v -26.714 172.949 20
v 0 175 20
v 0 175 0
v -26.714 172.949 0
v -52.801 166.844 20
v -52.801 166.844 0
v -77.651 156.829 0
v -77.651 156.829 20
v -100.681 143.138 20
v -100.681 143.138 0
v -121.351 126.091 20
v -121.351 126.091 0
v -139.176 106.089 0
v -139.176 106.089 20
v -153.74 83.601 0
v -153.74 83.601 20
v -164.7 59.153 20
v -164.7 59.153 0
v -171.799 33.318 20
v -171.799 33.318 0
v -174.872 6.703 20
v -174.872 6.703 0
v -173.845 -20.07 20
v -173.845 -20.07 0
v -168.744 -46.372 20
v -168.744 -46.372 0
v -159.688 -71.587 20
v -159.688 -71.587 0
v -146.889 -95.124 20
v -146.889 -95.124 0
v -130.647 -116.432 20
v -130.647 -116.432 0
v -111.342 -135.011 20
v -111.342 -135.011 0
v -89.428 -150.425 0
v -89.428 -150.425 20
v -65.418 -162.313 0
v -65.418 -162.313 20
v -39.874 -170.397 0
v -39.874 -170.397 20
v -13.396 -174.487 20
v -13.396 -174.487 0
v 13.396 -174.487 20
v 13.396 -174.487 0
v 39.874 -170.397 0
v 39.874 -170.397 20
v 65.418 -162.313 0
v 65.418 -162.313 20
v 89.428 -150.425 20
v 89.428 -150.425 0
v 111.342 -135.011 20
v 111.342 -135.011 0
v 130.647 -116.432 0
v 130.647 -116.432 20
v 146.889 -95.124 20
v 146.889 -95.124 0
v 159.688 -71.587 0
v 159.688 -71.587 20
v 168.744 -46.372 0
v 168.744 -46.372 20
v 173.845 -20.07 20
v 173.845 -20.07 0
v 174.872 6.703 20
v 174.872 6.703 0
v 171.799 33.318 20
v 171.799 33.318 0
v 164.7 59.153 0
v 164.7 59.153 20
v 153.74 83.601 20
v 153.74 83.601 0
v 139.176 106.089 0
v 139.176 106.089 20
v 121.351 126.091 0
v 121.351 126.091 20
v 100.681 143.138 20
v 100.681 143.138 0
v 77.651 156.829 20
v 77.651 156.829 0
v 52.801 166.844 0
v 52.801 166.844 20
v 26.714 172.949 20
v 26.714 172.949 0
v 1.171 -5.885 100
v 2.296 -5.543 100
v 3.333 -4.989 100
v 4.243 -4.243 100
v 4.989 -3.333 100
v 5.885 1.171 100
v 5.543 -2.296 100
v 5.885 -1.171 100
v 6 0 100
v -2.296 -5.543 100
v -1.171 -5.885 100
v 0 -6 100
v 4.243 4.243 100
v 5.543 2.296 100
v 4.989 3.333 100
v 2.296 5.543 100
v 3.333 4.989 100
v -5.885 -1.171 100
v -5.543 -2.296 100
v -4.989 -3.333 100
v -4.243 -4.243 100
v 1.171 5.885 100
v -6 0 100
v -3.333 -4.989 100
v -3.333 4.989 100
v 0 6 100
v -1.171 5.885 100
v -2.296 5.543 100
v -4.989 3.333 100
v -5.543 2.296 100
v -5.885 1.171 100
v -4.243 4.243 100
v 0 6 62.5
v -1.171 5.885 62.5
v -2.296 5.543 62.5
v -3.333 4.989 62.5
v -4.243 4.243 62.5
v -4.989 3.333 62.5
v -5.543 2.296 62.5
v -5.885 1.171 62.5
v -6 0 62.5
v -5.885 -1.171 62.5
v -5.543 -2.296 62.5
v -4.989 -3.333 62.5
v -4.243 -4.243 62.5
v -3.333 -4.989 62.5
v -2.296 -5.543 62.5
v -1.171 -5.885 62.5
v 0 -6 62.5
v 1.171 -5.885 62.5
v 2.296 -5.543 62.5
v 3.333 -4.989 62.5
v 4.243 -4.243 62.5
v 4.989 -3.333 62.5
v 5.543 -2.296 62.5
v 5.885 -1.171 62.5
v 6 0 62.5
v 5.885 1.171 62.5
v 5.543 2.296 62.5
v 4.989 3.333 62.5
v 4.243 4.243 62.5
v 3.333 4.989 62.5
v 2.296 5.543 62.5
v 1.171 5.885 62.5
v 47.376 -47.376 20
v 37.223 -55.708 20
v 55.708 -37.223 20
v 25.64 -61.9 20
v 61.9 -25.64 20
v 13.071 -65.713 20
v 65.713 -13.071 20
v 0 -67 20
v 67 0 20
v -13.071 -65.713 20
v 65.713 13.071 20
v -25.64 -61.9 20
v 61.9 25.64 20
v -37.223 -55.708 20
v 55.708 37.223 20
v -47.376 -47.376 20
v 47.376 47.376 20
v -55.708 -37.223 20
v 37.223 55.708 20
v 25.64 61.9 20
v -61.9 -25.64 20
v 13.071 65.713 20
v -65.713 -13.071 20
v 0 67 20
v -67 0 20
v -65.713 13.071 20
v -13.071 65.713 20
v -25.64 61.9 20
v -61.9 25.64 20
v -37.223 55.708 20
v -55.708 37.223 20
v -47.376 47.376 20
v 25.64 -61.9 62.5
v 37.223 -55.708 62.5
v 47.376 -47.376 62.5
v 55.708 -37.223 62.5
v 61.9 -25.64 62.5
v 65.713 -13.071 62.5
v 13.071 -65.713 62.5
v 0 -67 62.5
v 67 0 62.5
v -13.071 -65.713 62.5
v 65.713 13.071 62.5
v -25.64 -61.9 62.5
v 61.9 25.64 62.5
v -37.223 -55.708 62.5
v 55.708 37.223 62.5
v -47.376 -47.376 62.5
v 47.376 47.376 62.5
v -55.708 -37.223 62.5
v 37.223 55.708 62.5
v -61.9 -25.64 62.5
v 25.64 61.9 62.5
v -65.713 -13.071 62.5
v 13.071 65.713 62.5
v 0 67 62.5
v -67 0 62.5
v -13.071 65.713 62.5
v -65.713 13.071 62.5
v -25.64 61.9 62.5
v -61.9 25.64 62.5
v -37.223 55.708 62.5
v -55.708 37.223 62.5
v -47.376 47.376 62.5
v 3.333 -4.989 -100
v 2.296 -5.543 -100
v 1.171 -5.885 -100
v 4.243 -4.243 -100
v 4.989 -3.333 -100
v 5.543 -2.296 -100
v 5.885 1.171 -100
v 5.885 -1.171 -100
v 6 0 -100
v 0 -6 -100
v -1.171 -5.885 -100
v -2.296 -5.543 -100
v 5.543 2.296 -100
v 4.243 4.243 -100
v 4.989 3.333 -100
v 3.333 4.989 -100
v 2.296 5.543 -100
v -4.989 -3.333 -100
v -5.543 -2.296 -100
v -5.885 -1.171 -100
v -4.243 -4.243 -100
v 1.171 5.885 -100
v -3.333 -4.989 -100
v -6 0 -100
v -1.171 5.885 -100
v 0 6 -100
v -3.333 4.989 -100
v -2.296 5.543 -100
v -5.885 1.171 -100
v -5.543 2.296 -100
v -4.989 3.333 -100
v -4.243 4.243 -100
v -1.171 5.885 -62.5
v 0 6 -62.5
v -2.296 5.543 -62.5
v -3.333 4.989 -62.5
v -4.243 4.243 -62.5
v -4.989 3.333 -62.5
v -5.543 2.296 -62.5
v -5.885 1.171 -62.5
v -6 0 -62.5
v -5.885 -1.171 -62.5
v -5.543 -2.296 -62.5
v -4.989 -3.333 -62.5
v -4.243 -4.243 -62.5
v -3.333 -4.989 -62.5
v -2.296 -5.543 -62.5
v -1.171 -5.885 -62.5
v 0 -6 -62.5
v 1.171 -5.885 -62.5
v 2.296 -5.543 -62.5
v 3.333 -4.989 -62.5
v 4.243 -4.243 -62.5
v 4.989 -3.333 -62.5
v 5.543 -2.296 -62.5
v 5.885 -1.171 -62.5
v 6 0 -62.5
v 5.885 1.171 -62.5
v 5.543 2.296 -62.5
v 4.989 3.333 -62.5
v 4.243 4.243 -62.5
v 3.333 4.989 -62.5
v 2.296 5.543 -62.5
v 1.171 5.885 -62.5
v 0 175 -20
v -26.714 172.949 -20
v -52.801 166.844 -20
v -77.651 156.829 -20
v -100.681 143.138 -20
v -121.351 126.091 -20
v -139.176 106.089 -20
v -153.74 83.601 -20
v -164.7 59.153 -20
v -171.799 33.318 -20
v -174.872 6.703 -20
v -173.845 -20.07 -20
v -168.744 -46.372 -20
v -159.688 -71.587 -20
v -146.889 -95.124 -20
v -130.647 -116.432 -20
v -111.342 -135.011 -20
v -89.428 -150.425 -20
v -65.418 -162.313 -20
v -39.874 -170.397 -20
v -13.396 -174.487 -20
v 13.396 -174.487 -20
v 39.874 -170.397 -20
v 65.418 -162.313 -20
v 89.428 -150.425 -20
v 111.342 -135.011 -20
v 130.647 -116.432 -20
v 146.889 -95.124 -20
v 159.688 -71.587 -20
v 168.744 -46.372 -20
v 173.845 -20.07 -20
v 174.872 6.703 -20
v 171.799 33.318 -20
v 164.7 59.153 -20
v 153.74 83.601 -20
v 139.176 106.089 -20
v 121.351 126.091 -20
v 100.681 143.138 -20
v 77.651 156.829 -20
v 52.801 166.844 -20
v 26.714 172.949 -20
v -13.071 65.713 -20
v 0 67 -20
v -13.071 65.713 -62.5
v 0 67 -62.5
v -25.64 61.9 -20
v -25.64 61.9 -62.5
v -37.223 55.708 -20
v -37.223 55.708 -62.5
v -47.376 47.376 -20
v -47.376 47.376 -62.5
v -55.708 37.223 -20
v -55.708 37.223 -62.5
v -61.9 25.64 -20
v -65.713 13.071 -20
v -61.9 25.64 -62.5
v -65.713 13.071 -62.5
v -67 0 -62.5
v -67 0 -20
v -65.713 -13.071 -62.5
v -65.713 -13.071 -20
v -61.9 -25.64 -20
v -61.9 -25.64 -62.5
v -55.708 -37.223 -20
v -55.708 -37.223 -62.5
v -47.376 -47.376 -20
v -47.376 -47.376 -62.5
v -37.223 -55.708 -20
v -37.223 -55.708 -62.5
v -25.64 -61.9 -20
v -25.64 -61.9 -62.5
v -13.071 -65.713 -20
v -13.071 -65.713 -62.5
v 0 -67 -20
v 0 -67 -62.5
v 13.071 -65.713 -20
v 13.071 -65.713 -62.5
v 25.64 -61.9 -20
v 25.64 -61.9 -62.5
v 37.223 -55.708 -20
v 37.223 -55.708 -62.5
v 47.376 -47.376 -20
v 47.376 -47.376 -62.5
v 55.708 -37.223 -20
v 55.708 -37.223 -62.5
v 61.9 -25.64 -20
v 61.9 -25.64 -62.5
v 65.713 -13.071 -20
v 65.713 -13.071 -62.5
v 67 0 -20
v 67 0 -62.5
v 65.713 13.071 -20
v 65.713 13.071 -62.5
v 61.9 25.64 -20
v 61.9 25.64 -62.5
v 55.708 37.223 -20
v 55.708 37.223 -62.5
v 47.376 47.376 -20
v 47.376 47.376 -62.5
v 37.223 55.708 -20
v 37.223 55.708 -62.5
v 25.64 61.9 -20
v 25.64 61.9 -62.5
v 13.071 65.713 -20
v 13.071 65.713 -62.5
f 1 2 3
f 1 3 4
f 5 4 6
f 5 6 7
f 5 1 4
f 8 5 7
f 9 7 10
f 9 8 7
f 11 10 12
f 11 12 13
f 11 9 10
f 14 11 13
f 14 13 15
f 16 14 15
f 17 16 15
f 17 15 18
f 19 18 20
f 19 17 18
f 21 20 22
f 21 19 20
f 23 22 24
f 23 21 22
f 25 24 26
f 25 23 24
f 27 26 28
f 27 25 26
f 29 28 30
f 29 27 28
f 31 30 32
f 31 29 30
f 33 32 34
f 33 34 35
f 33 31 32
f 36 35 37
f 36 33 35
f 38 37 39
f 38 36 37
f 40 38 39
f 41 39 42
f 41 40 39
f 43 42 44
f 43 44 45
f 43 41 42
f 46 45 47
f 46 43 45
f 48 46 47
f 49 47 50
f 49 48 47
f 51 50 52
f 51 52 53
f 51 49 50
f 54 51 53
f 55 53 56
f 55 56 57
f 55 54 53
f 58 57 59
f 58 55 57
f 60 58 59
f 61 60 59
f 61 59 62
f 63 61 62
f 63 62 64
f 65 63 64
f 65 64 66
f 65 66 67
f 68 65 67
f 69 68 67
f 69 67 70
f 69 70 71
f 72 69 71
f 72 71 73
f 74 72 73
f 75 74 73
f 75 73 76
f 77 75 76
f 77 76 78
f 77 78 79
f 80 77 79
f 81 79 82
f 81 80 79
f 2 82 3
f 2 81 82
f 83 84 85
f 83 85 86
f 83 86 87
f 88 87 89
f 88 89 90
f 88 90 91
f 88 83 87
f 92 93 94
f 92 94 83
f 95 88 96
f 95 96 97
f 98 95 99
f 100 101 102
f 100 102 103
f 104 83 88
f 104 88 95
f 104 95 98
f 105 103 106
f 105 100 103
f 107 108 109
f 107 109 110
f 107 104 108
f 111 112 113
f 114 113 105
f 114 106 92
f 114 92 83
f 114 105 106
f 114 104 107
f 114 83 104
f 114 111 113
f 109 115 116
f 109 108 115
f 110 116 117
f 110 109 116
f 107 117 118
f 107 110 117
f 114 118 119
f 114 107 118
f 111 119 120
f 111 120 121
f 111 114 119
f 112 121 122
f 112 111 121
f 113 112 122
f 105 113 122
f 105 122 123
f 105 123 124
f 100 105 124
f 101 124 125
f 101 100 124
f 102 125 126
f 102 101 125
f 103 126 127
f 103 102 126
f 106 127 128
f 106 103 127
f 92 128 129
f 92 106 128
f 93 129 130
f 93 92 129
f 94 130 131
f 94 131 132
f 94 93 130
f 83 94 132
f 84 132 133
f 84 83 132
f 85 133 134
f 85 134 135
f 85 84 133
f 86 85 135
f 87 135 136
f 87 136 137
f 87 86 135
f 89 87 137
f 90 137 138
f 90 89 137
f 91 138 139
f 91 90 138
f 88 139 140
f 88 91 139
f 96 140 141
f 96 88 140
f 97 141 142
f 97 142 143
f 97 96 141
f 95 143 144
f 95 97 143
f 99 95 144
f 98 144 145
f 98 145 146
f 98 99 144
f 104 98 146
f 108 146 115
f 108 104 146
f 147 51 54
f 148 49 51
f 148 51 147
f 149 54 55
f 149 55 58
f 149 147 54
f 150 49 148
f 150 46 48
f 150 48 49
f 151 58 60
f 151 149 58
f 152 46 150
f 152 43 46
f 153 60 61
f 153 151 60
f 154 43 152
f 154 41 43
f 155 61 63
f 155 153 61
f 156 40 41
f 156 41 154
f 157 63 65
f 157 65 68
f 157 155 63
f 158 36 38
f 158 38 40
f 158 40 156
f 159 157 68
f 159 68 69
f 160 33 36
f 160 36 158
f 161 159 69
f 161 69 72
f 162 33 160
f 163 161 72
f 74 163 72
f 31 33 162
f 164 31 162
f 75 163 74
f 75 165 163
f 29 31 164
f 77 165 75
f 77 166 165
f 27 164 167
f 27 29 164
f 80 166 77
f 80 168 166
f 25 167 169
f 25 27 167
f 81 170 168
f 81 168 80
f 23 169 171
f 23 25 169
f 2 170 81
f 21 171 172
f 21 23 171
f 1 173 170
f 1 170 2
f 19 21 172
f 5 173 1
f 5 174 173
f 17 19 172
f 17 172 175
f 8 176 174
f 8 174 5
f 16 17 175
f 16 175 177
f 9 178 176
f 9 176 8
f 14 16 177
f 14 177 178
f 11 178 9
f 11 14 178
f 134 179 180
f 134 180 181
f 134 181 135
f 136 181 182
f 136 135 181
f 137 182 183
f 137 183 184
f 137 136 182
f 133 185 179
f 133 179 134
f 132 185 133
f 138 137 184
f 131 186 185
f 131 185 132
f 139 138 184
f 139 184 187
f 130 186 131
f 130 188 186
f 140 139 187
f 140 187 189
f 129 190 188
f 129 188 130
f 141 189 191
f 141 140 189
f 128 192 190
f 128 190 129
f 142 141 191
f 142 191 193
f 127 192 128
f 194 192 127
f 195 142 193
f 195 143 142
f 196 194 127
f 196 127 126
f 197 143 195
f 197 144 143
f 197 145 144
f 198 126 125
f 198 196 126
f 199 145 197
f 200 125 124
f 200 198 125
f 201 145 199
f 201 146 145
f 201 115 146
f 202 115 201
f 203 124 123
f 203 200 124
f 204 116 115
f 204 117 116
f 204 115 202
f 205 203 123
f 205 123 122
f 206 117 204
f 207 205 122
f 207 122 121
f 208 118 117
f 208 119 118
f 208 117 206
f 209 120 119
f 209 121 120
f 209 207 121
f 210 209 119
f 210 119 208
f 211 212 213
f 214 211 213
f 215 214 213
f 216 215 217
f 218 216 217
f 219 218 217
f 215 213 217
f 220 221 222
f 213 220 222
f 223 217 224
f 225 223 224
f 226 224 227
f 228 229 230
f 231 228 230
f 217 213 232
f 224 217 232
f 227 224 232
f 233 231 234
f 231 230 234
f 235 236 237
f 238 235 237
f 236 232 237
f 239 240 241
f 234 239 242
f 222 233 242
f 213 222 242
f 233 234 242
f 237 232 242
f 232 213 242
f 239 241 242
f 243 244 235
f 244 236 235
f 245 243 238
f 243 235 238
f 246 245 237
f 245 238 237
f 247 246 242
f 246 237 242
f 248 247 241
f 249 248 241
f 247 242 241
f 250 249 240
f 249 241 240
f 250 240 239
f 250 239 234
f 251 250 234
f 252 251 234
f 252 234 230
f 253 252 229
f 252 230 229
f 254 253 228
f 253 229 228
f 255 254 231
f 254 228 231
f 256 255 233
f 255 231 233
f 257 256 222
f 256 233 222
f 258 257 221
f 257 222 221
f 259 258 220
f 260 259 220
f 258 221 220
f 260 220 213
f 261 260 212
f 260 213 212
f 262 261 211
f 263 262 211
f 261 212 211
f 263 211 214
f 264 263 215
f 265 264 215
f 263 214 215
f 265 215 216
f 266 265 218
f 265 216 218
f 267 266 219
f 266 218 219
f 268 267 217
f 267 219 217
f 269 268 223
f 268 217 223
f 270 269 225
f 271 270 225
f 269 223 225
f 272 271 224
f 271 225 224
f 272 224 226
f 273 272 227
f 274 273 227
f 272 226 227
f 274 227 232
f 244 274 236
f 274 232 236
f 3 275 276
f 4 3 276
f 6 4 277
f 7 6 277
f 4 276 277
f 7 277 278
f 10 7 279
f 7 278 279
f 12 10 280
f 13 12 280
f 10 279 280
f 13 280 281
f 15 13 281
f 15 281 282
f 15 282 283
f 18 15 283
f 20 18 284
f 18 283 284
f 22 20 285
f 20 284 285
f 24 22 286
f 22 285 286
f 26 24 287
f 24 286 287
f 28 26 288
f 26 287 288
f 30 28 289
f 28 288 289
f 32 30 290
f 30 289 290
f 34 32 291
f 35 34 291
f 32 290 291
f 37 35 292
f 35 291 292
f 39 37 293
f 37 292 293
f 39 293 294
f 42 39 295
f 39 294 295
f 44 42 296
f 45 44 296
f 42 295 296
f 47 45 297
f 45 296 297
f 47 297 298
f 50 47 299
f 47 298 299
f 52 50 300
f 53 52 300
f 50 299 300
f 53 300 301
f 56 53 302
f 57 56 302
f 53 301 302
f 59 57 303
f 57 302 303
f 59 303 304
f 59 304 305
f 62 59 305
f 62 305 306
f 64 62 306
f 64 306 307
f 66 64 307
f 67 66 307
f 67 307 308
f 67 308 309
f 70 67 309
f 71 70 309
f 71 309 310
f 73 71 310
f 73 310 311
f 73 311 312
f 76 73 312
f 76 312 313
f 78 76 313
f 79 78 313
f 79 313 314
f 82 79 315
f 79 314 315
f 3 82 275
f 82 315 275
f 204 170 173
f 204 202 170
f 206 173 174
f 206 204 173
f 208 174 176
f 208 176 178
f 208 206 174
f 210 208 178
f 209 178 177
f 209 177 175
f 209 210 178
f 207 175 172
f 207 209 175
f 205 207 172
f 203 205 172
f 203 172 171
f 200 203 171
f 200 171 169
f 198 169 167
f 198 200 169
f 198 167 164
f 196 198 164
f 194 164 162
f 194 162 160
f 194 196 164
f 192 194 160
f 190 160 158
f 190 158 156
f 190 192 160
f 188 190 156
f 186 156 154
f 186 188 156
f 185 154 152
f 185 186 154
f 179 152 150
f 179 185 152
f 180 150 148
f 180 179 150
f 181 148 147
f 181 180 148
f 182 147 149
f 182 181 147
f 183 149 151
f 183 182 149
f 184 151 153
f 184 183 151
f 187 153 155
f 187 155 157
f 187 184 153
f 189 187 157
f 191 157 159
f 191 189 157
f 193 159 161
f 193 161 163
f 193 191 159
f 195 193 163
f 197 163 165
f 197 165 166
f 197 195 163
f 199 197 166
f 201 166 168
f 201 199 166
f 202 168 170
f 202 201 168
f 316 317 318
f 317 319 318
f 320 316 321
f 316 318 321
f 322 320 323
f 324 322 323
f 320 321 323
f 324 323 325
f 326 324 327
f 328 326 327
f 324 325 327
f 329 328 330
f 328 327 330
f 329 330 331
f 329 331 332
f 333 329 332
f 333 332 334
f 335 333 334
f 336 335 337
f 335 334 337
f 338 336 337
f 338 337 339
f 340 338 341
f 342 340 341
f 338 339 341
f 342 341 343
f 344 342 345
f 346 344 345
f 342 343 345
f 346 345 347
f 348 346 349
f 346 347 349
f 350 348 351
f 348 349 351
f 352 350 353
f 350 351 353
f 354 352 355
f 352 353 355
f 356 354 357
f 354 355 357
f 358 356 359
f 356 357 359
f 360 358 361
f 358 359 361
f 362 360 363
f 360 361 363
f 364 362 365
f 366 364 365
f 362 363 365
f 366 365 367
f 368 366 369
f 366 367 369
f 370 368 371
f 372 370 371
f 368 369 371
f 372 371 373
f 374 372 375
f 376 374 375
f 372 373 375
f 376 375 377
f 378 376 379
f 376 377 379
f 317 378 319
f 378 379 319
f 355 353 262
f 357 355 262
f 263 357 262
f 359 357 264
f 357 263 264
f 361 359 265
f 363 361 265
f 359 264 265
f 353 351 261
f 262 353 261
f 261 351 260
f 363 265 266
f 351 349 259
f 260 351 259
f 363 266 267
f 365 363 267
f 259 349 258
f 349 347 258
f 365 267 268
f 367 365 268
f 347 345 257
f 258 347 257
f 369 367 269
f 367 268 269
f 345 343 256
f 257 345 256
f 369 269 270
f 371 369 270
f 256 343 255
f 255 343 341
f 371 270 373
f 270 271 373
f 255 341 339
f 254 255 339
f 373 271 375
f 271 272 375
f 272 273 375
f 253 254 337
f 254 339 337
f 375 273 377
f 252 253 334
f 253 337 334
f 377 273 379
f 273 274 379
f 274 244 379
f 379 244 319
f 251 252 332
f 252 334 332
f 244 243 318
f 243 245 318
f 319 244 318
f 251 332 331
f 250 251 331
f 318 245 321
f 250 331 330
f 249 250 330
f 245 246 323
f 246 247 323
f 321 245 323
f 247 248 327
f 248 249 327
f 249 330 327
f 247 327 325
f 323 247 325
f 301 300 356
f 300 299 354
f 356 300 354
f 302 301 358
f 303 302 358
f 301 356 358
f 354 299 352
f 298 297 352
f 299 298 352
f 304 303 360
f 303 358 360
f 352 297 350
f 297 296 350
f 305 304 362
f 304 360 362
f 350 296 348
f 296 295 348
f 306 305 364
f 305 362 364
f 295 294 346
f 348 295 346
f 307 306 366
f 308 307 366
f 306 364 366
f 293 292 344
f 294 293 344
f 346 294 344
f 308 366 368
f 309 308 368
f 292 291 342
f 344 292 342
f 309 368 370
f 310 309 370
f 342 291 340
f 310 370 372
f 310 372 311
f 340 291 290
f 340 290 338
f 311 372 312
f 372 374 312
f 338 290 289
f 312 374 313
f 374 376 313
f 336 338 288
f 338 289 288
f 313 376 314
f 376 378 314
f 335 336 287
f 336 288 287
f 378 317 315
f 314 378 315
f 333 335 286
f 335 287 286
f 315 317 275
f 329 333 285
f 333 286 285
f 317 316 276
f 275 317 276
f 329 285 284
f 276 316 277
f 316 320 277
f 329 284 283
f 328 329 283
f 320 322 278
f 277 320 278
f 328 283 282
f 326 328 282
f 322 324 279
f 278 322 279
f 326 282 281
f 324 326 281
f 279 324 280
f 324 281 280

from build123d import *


with BuildPart() as part:
    # 草图3 → 旋转1 (revolve)
    with BuildSketch(Plane(origin=(0, 0, 0), x_dir=(0, 0, -1), z_dir=(1, 0, 0))):
        Polygon((0, 0), (0, 175), (20, 175), (20, 67), (62.5, 67), (62.5, 6), (100, 6), (100, 0), align=None)
    revolve_1 = revolve(axis=Axis((0, 0, -100), (0, 0, 1)))

    # 镜向1: 旋转1 across plane
    add(revolve_1.mirror(Plane.XY))


solid = part.part
